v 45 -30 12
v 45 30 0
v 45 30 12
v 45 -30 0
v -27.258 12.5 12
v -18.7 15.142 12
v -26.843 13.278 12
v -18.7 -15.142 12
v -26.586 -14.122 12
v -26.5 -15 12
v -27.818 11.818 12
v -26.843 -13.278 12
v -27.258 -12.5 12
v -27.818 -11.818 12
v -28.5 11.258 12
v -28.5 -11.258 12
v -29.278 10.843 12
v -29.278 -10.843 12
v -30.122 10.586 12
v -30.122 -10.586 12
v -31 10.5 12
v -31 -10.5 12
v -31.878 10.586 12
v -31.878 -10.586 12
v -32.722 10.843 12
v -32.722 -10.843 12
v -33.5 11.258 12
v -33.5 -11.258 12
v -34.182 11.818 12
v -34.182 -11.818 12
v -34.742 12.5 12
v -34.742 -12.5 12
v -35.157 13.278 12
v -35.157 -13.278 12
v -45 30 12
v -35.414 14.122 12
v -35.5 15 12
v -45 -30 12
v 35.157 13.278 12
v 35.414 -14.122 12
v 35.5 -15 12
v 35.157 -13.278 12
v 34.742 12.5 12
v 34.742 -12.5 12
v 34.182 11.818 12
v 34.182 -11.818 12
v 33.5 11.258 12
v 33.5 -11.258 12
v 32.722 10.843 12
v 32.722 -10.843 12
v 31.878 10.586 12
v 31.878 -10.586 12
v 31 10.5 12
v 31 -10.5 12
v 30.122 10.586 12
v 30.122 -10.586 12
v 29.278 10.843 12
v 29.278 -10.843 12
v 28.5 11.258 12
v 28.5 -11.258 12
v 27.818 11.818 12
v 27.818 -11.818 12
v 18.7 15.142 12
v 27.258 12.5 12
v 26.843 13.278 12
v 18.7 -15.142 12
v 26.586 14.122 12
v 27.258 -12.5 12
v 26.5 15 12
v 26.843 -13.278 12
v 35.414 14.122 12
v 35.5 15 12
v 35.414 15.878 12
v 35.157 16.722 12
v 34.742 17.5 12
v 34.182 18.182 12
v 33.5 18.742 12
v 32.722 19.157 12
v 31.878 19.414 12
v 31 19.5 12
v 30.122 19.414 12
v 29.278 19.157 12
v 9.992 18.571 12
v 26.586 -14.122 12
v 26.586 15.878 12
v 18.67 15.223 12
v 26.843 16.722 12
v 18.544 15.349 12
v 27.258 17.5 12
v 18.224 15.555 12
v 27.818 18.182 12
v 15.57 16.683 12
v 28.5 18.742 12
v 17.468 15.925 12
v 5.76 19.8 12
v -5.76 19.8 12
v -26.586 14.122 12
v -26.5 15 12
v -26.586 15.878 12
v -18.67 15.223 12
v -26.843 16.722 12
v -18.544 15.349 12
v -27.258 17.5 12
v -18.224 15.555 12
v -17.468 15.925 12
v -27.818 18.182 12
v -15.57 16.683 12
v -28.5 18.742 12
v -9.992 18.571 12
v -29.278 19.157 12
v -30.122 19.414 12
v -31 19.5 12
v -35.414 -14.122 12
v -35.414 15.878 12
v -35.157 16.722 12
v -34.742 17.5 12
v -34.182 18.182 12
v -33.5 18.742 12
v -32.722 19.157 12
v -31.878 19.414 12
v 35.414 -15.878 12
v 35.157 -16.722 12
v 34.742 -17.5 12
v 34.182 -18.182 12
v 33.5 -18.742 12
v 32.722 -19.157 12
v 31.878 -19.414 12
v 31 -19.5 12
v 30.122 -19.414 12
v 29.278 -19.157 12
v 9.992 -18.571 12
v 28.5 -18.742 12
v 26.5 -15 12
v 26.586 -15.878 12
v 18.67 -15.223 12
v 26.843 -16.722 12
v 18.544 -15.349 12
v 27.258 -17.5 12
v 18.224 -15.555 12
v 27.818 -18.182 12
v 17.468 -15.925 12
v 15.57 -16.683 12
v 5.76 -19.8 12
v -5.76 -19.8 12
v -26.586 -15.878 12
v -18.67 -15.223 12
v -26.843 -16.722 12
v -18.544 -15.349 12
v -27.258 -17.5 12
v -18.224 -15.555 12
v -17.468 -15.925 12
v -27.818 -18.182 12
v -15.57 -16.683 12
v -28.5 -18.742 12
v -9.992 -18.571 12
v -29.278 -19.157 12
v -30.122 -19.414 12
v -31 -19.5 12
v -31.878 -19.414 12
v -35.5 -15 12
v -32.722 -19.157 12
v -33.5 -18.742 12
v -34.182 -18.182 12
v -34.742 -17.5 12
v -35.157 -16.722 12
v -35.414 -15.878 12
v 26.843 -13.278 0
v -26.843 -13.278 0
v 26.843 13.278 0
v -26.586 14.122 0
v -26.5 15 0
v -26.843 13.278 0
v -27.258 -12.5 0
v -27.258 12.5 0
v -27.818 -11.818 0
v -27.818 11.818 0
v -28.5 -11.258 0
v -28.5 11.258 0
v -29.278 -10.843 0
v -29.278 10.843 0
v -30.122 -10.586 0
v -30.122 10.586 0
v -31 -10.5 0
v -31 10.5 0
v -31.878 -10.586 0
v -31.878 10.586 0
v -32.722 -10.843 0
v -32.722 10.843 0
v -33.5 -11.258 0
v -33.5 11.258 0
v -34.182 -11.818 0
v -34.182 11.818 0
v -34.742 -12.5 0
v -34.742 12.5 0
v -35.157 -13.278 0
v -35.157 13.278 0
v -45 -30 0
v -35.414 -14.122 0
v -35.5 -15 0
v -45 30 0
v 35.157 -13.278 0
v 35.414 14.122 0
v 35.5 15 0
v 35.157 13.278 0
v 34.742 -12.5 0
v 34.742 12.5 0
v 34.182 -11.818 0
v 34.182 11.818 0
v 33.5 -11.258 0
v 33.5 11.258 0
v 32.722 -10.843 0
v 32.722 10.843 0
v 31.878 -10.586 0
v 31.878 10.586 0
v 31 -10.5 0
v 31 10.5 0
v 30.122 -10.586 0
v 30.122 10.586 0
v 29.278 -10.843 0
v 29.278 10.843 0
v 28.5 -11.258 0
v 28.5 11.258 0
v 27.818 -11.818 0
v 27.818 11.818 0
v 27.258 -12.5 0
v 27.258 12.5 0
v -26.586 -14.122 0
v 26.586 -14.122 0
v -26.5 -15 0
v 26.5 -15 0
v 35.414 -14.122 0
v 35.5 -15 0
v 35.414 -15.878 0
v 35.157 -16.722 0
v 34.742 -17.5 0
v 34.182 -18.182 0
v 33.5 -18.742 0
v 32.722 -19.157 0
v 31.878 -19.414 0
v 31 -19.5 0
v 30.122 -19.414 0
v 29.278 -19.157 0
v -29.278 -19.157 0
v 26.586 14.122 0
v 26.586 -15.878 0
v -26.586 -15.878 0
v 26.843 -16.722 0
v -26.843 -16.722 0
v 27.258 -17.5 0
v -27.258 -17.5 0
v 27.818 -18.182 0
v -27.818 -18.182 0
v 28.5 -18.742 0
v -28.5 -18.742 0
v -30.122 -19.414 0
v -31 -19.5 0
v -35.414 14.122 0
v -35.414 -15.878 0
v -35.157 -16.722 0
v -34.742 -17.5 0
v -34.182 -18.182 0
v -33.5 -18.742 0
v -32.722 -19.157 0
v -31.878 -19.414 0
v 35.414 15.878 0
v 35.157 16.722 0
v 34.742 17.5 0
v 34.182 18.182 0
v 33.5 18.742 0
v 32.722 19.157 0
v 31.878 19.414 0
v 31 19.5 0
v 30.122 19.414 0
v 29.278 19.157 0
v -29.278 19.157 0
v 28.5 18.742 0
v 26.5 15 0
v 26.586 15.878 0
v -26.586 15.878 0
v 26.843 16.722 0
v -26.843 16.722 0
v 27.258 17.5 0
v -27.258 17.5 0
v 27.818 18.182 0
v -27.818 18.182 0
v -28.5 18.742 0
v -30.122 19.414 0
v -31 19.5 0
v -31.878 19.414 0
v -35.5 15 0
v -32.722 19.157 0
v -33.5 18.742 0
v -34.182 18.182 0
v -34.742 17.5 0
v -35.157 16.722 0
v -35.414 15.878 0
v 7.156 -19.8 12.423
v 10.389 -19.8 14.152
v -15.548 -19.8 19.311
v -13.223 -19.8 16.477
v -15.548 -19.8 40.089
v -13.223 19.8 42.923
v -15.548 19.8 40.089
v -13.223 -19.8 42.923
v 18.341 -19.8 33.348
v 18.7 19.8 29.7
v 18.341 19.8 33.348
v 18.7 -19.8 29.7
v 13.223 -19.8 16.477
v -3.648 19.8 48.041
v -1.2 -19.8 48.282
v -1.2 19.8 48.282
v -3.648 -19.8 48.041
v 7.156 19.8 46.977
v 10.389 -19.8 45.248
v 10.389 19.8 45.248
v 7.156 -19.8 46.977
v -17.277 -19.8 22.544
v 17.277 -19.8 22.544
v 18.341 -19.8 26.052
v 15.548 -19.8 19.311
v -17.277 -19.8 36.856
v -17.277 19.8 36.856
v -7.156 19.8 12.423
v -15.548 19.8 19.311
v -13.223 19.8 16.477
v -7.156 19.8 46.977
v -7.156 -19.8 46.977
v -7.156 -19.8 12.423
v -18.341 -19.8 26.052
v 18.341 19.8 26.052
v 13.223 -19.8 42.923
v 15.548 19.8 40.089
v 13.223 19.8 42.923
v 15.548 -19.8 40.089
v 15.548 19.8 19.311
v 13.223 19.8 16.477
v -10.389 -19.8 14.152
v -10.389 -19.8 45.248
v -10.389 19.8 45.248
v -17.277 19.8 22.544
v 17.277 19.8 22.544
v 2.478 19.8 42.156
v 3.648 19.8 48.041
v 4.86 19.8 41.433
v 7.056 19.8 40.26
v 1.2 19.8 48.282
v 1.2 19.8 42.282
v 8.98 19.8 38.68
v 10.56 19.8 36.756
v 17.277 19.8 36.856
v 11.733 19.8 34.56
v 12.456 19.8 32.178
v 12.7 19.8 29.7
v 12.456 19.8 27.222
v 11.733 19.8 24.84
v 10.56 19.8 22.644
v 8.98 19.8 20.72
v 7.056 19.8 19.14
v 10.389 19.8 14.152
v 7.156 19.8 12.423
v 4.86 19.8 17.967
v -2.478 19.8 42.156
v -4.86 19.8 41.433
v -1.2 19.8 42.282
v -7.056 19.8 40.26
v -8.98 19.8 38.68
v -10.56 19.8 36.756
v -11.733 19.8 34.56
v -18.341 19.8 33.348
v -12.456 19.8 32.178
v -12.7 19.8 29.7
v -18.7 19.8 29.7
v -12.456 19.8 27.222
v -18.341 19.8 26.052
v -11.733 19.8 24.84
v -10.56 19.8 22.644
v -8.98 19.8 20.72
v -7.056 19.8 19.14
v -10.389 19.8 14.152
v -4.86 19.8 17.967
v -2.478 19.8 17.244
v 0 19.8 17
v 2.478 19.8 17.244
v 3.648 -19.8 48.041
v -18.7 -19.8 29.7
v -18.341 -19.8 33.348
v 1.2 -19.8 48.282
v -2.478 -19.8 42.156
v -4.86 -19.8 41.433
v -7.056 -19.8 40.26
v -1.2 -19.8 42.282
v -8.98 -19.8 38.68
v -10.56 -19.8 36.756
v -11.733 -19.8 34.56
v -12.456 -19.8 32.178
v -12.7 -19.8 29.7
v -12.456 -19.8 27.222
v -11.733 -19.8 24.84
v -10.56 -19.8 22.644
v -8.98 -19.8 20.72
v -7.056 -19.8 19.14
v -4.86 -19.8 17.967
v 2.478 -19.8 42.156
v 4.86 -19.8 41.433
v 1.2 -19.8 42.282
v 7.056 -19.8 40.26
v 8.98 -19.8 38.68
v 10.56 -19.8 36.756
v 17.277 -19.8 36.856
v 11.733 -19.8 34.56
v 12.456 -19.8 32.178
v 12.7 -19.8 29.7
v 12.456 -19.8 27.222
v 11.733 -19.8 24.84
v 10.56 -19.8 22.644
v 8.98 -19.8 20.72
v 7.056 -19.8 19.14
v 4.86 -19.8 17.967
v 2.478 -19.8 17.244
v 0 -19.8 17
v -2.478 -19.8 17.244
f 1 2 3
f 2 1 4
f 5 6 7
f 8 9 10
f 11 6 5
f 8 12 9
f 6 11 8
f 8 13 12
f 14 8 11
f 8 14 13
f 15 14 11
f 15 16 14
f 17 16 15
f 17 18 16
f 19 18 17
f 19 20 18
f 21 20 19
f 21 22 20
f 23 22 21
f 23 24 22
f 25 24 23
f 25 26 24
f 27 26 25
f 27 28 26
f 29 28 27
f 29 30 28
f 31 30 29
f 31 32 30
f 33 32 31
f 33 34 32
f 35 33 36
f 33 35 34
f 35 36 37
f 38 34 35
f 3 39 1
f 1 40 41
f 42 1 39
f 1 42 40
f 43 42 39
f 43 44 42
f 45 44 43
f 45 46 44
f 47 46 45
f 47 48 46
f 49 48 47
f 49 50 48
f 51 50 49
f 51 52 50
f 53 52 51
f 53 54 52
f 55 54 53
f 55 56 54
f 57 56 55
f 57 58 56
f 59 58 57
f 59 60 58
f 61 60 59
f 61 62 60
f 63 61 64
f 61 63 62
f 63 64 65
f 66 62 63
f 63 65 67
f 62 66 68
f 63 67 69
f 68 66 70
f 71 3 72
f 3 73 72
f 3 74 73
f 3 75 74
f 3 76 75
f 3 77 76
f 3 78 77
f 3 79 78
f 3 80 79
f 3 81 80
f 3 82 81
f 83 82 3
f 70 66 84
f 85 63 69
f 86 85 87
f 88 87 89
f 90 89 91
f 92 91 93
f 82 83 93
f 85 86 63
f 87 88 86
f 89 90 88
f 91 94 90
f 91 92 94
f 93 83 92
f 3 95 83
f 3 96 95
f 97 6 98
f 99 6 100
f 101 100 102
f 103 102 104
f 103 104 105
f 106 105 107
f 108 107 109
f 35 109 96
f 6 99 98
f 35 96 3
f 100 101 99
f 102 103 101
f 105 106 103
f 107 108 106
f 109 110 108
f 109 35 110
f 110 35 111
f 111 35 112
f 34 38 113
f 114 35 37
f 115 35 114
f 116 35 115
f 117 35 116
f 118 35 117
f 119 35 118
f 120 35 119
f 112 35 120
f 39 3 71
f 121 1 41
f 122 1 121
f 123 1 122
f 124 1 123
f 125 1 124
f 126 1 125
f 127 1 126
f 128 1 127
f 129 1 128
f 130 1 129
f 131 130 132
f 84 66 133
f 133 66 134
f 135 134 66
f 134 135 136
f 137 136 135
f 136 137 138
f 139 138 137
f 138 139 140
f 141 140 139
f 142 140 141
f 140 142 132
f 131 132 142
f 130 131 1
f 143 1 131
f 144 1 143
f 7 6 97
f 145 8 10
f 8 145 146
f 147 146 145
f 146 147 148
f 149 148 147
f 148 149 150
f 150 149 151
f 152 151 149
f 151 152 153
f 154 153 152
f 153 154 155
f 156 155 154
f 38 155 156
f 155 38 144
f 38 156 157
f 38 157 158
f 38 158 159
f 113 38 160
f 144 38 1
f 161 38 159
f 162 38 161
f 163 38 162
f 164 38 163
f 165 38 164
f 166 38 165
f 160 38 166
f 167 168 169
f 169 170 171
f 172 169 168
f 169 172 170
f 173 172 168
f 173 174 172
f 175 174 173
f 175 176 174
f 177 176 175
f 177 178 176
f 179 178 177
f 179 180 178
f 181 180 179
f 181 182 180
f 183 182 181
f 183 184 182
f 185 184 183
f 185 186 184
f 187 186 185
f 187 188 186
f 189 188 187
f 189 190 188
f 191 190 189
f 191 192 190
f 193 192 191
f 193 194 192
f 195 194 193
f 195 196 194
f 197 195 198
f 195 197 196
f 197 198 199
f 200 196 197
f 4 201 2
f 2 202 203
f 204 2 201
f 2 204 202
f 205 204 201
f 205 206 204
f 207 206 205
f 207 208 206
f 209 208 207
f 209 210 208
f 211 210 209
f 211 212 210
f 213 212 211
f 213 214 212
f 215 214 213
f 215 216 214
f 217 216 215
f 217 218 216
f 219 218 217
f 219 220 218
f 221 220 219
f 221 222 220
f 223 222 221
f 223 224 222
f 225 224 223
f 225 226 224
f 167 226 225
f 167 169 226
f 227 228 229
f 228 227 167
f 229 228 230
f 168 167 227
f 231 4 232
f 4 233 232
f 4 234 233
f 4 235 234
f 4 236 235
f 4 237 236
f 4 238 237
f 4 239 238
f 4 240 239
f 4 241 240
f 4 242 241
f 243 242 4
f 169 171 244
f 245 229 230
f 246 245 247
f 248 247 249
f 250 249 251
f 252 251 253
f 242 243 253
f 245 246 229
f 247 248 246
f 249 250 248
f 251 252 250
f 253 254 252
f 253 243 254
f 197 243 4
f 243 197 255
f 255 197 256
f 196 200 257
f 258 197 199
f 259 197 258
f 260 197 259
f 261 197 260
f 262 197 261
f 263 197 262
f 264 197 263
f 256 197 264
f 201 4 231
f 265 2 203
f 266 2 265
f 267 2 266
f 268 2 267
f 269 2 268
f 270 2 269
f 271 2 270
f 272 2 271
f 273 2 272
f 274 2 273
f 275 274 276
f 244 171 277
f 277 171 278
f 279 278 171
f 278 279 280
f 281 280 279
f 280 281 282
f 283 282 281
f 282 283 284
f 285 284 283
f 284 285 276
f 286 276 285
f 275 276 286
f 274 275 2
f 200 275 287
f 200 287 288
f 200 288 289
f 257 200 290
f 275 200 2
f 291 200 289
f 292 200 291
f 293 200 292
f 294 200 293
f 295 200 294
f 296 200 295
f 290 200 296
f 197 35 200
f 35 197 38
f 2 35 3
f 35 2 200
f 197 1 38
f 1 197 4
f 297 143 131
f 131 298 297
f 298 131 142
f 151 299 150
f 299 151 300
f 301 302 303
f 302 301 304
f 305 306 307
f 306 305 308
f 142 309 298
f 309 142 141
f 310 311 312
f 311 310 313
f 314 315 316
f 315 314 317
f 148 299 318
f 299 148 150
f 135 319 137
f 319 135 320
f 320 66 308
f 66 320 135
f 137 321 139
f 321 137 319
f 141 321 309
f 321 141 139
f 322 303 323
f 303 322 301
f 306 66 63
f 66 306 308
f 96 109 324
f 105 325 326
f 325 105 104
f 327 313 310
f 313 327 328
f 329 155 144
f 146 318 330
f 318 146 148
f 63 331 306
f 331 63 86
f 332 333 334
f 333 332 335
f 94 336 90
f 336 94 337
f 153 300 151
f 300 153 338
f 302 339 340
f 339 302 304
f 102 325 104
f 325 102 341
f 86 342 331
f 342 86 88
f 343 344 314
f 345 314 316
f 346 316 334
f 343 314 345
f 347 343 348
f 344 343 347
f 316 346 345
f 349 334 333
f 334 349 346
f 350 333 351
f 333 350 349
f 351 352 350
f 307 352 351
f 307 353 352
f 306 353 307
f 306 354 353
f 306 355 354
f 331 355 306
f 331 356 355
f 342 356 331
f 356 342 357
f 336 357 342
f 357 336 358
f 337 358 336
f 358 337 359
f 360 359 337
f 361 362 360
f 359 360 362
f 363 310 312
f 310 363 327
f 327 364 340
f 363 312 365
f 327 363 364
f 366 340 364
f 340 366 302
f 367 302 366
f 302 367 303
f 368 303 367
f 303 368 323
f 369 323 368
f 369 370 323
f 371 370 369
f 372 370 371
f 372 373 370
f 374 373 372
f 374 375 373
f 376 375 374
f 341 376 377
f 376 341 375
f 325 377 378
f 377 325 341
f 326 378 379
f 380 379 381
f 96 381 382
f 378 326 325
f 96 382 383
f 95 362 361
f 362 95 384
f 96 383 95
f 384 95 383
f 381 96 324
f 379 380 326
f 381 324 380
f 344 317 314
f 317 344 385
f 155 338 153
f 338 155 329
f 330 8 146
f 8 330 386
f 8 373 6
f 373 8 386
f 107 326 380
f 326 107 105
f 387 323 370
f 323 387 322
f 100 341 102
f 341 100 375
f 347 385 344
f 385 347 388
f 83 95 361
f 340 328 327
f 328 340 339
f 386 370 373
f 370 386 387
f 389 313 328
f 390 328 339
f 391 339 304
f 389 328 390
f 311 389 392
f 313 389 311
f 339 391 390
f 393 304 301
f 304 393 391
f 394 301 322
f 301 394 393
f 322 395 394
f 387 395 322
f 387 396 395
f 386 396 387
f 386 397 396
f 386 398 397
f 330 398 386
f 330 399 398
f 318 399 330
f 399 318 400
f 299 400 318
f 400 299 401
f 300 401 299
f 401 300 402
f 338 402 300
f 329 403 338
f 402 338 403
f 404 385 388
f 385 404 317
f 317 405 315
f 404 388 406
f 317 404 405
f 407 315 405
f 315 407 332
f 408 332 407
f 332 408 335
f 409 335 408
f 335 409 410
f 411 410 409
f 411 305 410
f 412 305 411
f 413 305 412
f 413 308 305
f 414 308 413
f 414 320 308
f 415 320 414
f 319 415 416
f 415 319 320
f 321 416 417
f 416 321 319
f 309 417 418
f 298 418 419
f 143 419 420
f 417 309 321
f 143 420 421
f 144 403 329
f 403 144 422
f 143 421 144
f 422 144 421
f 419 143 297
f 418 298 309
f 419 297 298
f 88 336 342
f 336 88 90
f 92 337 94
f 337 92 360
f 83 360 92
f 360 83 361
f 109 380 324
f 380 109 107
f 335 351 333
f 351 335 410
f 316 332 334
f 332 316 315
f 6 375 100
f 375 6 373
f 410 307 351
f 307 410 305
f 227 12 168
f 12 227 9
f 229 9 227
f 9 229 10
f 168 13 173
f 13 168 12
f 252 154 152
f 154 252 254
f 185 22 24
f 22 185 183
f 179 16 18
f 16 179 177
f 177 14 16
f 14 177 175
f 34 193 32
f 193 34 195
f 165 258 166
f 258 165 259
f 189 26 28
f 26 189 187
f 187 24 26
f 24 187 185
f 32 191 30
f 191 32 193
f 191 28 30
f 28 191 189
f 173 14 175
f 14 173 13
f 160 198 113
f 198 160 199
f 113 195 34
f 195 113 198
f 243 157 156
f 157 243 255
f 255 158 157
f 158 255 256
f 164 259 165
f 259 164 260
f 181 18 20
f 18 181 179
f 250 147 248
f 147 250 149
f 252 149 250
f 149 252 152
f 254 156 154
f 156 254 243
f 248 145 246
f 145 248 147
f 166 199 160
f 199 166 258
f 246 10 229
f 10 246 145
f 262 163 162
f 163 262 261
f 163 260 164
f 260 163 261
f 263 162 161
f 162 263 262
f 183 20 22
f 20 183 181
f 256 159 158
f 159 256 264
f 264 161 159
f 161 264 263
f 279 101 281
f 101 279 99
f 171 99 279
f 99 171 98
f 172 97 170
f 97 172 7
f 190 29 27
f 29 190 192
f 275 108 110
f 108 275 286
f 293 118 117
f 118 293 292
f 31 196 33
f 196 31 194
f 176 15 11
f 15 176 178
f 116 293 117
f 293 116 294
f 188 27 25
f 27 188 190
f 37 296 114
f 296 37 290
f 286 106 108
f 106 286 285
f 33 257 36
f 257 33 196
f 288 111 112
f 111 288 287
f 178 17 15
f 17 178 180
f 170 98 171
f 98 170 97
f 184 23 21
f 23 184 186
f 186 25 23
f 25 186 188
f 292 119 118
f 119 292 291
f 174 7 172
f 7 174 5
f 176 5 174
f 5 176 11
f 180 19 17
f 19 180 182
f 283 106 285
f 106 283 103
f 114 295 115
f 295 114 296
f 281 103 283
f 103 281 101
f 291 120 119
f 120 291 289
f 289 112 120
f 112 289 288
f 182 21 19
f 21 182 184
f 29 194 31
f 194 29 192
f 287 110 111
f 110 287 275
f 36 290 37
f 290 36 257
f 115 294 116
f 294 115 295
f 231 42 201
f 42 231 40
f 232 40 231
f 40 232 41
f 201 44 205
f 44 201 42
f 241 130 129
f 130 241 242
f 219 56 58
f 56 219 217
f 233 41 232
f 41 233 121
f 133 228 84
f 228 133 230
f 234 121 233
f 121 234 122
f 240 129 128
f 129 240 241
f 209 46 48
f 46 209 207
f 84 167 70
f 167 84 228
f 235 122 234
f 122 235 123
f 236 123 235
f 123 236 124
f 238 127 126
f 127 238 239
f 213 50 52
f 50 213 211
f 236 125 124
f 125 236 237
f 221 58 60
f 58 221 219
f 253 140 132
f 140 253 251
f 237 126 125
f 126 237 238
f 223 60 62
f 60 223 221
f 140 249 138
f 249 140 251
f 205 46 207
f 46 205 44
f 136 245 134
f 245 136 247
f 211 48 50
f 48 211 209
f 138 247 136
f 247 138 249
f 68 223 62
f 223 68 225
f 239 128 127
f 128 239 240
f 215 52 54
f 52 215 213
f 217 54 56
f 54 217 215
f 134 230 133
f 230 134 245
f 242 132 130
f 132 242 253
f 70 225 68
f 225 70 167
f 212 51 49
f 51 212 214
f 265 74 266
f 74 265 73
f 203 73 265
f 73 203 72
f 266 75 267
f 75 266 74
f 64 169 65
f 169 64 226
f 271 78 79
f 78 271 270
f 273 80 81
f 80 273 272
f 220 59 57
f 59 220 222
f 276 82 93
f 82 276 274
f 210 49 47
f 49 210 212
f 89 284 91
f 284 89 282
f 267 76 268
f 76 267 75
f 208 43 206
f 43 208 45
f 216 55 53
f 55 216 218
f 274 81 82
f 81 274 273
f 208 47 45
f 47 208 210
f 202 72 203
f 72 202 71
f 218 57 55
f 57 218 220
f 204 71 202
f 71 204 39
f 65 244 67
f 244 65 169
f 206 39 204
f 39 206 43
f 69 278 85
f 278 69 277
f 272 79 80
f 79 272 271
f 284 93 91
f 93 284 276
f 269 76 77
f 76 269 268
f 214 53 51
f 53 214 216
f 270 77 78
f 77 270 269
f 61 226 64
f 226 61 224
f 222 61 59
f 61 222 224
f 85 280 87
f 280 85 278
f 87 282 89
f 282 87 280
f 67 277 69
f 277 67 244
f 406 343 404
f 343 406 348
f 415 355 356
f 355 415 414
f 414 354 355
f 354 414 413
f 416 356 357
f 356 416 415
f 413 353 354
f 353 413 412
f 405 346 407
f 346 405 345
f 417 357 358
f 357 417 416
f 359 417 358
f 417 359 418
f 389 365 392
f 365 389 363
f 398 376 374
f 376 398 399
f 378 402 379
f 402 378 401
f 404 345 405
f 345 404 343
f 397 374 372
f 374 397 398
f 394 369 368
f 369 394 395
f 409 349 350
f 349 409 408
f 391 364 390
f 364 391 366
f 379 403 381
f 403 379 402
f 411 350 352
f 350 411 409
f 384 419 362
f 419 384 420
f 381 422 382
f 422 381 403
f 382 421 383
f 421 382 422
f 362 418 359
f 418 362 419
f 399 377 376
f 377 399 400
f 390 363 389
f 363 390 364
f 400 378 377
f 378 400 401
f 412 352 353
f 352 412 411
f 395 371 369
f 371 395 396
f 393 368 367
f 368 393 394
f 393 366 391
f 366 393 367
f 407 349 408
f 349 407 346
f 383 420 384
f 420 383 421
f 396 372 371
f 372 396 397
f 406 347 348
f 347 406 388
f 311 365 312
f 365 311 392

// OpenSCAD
$fn = 32;

// ----------------------------------------------------------------------
// Bearing block: 90 x 60 mm base, 25.4 mm bore at 29.7 mm
// ----------------------------------------------------------------------

// --- parameters (mm) ---
base_w = 90;              // base width
base_d = 60;              // base depth
base_t = 12;              // base thickness
bore_d = 25.4;            // shaft / bearing bore
house_r = 18.7;           // housing outer radius
house_len = 39.6;         // housing length along the shaft
foot_w = 37.4;            // foot width under the housing
foot_len = 29.6;          // foot length along the shaft
axis_z = 29.7;            // bore axis height above the base
holes_d = 9;              // mounting holes
hole_x = 31;              // mounting hole spacing
groove_w = 2.4;           // oil groove width

difference() {
  union() {
    /* base plate with its underside on z = 0 */
    translate([0, 0, base_t / 2]) cube([base_w, base_d, base_t], center = true);
    /* hull foot: a straight web blending into the round housing */
    hull() {
      translate([0, 0, base_t - 0.5]) cube([foot_w, foot_len, 1.6], center = true);
      translate([0, 0, axis_z]) rotate([-90, 0, 0]) cylinder(h = house_len, d = 2 * house_r, center = true);
    }
  }
  /* bore through the housing, 2.5 mm clear on both sides */
  translate([0, 0, axis_z]) rotate([-90, 0, 0]) cylinder(h = house_len + 5, d = bore_d, center = true);
  /* oil groove from the top of the housing into the bore */
  translate([-groove_w / 2, -house_len / 2 - 2.5, axis_z + bore_d * 0.17]) cube([groove_w, house_len + 5, house_r + 5]);
  /* mounting holes through the base plate */
  for (hx = [-31, 31]) {
    for (hy = [-15, 15]) {
      translate([hx, hy, -2.5]) cylinder(h = base_t + 5, d = holes_d);
    }
  }
}
